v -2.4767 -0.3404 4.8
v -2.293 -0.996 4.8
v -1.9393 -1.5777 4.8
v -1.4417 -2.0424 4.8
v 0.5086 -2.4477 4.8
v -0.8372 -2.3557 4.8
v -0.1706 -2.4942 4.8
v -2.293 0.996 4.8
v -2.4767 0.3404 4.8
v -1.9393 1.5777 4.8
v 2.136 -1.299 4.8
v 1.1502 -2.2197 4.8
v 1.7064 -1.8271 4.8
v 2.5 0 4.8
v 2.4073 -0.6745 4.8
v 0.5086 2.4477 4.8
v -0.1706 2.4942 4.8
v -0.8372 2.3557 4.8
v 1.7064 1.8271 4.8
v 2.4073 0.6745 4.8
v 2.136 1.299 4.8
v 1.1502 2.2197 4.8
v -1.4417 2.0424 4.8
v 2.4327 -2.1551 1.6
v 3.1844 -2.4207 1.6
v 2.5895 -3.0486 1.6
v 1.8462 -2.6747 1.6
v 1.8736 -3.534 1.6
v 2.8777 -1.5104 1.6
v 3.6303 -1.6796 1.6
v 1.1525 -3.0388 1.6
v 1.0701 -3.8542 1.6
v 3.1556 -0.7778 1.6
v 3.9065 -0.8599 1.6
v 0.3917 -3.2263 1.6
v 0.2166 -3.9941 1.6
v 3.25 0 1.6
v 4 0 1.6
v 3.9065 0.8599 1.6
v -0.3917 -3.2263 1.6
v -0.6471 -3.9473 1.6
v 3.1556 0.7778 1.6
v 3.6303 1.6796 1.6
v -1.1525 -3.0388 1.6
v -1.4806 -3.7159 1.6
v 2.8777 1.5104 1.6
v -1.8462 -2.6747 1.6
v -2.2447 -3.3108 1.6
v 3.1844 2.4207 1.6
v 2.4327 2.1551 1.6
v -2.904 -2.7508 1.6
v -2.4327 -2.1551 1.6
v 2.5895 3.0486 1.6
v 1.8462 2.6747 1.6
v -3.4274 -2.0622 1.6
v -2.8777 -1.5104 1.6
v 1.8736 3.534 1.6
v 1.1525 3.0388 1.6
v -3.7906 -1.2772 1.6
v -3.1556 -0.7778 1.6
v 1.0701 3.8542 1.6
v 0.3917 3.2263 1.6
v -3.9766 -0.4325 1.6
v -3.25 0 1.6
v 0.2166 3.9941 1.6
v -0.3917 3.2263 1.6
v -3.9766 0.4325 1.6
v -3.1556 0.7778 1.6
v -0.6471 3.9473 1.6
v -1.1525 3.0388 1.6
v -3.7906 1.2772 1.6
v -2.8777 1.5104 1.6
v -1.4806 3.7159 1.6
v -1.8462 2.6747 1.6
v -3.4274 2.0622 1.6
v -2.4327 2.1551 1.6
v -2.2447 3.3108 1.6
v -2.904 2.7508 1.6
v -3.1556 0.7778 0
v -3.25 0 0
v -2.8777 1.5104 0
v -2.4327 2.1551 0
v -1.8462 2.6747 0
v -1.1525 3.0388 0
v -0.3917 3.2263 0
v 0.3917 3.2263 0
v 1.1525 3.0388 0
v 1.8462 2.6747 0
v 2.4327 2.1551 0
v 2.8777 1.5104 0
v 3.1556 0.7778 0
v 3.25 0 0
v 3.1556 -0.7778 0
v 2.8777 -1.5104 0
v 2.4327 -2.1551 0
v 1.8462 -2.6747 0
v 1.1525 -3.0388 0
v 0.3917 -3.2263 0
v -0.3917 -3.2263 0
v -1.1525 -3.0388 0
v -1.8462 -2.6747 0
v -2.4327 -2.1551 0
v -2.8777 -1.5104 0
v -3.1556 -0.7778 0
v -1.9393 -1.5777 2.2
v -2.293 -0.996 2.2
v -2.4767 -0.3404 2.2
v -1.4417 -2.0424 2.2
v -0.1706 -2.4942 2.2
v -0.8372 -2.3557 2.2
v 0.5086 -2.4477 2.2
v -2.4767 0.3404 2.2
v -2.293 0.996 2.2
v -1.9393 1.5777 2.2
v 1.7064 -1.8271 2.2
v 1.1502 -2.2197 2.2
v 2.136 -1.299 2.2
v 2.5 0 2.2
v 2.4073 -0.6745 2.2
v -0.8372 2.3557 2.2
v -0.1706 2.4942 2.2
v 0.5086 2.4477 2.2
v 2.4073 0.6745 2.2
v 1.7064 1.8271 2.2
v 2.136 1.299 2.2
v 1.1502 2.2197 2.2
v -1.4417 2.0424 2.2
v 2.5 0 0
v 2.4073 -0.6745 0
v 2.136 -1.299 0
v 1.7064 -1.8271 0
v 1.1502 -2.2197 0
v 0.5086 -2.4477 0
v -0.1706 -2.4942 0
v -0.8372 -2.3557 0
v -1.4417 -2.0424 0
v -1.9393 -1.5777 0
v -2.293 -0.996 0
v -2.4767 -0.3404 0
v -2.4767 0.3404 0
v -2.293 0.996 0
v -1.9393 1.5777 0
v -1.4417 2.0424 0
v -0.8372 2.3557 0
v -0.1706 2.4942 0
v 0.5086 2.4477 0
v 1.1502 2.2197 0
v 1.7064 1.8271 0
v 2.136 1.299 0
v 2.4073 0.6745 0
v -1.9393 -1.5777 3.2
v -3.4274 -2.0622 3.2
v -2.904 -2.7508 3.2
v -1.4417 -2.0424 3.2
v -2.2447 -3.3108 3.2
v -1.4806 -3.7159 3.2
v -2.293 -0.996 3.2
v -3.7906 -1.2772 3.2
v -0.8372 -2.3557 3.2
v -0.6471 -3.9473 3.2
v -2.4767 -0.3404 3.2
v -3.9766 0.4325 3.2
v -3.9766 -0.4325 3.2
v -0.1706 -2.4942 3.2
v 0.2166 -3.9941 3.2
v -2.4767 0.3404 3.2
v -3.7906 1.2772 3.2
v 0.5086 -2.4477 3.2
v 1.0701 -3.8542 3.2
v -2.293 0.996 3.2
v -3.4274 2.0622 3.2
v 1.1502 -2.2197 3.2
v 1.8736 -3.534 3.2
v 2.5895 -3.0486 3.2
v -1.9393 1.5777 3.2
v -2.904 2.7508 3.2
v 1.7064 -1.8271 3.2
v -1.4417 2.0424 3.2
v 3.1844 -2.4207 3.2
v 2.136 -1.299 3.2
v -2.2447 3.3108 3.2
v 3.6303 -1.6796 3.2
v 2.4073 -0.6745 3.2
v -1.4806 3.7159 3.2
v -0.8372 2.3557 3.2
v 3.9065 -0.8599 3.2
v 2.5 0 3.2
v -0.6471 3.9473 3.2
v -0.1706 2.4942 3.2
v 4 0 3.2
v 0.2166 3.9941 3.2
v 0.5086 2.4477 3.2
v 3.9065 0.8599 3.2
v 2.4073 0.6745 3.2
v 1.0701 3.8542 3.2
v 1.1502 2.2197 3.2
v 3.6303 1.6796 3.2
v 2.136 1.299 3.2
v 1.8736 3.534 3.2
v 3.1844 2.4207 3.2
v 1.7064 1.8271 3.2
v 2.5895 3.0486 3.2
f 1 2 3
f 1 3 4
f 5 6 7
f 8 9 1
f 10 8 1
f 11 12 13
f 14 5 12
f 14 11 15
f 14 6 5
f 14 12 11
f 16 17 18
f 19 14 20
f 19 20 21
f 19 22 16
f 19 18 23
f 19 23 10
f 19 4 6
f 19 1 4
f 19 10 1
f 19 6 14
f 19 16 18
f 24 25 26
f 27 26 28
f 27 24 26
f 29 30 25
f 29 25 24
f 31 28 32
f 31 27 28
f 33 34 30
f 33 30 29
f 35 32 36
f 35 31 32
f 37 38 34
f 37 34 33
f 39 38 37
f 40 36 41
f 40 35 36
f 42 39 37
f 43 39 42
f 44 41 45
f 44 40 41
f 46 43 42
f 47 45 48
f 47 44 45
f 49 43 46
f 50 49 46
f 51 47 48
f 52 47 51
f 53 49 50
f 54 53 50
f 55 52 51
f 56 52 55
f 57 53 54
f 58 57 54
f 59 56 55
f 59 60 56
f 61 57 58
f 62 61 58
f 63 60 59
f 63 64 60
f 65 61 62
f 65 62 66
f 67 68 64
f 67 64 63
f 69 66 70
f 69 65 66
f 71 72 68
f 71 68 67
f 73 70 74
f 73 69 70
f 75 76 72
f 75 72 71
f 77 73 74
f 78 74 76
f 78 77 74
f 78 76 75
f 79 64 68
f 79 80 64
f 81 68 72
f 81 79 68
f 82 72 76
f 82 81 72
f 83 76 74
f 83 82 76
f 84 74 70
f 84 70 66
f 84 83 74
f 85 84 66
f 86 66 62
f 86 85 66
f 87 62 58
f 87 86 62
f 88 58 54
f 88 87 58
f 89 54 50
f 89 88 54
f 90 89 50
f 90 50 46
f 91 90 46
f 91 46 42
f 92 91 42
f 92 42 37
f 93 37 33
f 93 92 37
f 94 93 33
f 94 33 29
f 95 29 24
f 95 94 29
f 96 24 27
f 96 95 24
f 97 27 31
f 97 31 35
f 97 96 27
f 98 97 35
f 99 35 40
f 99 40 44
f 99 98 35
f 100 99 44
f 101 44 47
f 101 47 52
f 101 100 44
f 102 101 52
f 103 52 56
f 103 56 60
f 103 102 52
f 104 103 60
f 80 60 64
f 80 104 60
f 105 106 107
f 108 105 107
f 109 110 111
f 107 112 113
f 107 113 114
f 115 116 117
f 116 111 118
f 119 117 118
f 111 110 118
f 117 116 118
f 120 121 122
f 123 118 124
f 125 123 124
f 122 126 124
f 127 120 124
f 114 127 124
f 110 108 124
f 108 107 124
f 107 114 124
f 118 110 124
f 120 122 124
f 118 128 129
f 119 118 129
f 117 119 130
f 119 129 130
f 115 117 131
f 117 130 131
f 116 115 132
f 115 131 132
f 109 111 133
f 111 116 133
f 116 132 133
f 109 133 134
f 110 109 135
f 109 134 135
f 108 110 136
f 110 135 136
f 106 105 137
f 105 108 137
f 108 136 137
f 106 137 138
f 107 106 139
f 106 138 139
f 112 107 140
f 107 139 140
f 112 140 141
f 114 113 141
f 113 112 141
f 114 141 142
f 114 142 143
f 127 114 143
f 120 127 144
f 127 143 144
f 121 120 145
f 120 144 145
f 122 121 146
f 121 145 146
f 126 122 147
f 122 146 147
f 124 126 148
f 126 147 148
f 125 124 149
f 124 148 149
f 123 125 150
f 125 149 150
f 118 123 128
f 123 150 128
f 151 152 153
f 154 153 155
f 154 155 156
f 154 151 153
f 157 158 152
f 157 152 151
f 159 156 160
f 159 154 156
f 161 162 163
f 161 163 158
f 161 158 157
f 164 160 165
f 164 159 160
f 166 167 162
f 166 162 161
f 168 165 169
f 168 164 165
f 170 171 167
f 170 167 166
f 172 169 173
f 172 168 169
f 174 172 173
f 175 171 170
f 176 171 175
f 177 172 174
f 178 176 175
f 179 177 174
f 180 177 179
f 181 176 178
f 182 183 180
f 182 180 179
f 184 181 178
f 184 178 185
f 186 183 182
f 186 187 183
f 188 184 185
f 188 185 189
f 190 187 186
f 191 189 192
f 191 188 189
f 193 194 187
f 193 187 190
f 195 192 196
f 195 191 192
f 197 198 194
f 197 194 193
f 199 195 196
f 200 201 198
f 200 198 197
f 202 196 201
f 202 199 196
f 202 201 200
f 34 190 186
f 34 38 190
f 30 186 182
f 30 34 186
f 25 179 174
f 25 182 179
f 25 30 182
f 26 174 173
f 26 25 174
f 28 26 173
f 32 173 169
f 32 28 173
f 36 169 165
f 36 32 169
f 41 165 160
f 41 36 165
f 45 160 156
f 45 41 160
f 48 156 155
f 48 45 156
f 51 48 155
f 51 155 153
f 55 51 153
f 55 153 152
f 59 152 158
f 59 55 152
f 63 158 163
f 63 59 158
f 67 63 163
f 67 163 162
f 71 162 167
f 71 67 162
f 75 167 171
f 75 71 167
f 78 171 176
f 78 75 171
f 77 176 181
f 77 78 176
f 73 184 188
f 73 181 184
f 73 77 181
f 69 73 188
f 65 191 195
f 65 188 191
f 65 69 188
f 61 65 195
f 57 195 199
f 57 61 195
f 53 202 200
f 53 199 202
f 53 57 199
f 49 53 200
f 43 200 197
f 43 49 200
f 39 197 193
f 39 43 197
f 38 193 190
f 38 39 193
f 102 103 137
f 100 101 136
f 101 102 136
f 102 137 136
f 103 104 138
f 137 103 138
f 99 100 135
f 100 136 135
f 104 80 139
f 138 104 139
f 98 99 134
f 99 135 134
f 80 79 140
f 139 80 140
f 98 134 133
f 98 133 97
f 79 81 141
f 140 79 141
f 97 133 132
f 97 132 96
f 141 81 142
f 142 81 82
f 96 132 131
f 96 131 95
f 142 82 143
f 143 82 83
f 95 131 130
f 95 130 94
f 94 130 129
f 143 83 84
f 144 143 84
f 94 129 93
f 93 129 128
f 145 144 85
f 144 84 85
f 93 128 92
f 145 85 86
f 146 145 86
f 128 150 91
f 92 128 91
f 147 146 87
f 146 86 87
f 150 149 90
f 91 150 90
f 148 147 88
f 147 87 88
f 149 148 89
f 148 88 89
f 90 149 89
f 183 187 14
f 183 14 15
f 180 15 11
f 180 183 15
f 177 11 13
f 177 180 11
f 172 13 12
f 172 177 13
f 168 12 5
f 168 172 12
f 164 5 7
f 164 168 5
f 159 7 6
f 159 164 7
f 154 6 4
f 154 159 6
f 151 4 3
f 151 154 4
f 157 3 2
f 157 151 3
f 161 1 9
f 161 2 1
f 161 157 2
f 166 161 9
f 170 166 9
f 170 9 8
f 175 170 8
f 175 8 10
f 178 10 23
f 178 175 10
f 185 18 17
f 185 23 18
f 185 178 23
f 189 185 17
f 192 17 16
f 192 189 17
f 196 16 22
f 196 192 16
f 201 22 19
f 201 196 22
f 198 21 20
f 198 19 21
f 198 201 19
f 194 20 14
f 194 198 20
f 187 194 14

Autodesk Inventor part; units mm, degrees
ref_plane "YZ Plane" through (0, 0, 0) normal (1, 0, 0) x (0, 1, 0)
ref_plane "XZ Plane" through (0, 0, 0) normal (0, 1, 0) x (-1, 0, 0)
ref_plane "XY Plane" through (0, 0, 0) normal (0, 0, 1) x (1, 0, 0)
sketch "Sketch1" plane through (0, 0, 0) normal (0, 0, 1) x (1, 0, 0)
  circle A0 centre (0, 0) radius 2.5
  circle A1 centre (0, 0) radius 4
  dimension "d0" = 5
  dimension "d1" = 8
extrude "Extrusion1" add sketch "Sketch1" along normal blind 3.2
sketch "Sketch2" plane through (0, 0, 3.2) normal (0, 0, 1) x (1, 0, 0)
  circle A0 centre (0, 0) radius 2.5 projected
extrude "Extrusion2" add sketch "Sketch2" against normal blind 1
sketch "Sketch3" plane through (0, 0, 3.2) normal (0, 0, 1) x (1, 0, 0)
  circle A0 centre (0, 0) radius 4 projected
  circle A1 centre (0, 0) radius 2.5
  dimension "d6" = 5
extrude "Extrusion3" add sketch "Sketch3" along normal blind 1.6 contours A1
sketch "Sketch4" plane through (0, 0, 0) normal (0, 0, -1) x (-1, 0, 0)
  circle A0 centre (0, 0) radius 4 projected
  circle A1 centre (0, 0) radius 3.25
  dimension "d9" = 6.5
extrude "Extrusion4" cut sketch "Sketch4" against normal blind 1.6
properties part number "4073" material "Steel"
